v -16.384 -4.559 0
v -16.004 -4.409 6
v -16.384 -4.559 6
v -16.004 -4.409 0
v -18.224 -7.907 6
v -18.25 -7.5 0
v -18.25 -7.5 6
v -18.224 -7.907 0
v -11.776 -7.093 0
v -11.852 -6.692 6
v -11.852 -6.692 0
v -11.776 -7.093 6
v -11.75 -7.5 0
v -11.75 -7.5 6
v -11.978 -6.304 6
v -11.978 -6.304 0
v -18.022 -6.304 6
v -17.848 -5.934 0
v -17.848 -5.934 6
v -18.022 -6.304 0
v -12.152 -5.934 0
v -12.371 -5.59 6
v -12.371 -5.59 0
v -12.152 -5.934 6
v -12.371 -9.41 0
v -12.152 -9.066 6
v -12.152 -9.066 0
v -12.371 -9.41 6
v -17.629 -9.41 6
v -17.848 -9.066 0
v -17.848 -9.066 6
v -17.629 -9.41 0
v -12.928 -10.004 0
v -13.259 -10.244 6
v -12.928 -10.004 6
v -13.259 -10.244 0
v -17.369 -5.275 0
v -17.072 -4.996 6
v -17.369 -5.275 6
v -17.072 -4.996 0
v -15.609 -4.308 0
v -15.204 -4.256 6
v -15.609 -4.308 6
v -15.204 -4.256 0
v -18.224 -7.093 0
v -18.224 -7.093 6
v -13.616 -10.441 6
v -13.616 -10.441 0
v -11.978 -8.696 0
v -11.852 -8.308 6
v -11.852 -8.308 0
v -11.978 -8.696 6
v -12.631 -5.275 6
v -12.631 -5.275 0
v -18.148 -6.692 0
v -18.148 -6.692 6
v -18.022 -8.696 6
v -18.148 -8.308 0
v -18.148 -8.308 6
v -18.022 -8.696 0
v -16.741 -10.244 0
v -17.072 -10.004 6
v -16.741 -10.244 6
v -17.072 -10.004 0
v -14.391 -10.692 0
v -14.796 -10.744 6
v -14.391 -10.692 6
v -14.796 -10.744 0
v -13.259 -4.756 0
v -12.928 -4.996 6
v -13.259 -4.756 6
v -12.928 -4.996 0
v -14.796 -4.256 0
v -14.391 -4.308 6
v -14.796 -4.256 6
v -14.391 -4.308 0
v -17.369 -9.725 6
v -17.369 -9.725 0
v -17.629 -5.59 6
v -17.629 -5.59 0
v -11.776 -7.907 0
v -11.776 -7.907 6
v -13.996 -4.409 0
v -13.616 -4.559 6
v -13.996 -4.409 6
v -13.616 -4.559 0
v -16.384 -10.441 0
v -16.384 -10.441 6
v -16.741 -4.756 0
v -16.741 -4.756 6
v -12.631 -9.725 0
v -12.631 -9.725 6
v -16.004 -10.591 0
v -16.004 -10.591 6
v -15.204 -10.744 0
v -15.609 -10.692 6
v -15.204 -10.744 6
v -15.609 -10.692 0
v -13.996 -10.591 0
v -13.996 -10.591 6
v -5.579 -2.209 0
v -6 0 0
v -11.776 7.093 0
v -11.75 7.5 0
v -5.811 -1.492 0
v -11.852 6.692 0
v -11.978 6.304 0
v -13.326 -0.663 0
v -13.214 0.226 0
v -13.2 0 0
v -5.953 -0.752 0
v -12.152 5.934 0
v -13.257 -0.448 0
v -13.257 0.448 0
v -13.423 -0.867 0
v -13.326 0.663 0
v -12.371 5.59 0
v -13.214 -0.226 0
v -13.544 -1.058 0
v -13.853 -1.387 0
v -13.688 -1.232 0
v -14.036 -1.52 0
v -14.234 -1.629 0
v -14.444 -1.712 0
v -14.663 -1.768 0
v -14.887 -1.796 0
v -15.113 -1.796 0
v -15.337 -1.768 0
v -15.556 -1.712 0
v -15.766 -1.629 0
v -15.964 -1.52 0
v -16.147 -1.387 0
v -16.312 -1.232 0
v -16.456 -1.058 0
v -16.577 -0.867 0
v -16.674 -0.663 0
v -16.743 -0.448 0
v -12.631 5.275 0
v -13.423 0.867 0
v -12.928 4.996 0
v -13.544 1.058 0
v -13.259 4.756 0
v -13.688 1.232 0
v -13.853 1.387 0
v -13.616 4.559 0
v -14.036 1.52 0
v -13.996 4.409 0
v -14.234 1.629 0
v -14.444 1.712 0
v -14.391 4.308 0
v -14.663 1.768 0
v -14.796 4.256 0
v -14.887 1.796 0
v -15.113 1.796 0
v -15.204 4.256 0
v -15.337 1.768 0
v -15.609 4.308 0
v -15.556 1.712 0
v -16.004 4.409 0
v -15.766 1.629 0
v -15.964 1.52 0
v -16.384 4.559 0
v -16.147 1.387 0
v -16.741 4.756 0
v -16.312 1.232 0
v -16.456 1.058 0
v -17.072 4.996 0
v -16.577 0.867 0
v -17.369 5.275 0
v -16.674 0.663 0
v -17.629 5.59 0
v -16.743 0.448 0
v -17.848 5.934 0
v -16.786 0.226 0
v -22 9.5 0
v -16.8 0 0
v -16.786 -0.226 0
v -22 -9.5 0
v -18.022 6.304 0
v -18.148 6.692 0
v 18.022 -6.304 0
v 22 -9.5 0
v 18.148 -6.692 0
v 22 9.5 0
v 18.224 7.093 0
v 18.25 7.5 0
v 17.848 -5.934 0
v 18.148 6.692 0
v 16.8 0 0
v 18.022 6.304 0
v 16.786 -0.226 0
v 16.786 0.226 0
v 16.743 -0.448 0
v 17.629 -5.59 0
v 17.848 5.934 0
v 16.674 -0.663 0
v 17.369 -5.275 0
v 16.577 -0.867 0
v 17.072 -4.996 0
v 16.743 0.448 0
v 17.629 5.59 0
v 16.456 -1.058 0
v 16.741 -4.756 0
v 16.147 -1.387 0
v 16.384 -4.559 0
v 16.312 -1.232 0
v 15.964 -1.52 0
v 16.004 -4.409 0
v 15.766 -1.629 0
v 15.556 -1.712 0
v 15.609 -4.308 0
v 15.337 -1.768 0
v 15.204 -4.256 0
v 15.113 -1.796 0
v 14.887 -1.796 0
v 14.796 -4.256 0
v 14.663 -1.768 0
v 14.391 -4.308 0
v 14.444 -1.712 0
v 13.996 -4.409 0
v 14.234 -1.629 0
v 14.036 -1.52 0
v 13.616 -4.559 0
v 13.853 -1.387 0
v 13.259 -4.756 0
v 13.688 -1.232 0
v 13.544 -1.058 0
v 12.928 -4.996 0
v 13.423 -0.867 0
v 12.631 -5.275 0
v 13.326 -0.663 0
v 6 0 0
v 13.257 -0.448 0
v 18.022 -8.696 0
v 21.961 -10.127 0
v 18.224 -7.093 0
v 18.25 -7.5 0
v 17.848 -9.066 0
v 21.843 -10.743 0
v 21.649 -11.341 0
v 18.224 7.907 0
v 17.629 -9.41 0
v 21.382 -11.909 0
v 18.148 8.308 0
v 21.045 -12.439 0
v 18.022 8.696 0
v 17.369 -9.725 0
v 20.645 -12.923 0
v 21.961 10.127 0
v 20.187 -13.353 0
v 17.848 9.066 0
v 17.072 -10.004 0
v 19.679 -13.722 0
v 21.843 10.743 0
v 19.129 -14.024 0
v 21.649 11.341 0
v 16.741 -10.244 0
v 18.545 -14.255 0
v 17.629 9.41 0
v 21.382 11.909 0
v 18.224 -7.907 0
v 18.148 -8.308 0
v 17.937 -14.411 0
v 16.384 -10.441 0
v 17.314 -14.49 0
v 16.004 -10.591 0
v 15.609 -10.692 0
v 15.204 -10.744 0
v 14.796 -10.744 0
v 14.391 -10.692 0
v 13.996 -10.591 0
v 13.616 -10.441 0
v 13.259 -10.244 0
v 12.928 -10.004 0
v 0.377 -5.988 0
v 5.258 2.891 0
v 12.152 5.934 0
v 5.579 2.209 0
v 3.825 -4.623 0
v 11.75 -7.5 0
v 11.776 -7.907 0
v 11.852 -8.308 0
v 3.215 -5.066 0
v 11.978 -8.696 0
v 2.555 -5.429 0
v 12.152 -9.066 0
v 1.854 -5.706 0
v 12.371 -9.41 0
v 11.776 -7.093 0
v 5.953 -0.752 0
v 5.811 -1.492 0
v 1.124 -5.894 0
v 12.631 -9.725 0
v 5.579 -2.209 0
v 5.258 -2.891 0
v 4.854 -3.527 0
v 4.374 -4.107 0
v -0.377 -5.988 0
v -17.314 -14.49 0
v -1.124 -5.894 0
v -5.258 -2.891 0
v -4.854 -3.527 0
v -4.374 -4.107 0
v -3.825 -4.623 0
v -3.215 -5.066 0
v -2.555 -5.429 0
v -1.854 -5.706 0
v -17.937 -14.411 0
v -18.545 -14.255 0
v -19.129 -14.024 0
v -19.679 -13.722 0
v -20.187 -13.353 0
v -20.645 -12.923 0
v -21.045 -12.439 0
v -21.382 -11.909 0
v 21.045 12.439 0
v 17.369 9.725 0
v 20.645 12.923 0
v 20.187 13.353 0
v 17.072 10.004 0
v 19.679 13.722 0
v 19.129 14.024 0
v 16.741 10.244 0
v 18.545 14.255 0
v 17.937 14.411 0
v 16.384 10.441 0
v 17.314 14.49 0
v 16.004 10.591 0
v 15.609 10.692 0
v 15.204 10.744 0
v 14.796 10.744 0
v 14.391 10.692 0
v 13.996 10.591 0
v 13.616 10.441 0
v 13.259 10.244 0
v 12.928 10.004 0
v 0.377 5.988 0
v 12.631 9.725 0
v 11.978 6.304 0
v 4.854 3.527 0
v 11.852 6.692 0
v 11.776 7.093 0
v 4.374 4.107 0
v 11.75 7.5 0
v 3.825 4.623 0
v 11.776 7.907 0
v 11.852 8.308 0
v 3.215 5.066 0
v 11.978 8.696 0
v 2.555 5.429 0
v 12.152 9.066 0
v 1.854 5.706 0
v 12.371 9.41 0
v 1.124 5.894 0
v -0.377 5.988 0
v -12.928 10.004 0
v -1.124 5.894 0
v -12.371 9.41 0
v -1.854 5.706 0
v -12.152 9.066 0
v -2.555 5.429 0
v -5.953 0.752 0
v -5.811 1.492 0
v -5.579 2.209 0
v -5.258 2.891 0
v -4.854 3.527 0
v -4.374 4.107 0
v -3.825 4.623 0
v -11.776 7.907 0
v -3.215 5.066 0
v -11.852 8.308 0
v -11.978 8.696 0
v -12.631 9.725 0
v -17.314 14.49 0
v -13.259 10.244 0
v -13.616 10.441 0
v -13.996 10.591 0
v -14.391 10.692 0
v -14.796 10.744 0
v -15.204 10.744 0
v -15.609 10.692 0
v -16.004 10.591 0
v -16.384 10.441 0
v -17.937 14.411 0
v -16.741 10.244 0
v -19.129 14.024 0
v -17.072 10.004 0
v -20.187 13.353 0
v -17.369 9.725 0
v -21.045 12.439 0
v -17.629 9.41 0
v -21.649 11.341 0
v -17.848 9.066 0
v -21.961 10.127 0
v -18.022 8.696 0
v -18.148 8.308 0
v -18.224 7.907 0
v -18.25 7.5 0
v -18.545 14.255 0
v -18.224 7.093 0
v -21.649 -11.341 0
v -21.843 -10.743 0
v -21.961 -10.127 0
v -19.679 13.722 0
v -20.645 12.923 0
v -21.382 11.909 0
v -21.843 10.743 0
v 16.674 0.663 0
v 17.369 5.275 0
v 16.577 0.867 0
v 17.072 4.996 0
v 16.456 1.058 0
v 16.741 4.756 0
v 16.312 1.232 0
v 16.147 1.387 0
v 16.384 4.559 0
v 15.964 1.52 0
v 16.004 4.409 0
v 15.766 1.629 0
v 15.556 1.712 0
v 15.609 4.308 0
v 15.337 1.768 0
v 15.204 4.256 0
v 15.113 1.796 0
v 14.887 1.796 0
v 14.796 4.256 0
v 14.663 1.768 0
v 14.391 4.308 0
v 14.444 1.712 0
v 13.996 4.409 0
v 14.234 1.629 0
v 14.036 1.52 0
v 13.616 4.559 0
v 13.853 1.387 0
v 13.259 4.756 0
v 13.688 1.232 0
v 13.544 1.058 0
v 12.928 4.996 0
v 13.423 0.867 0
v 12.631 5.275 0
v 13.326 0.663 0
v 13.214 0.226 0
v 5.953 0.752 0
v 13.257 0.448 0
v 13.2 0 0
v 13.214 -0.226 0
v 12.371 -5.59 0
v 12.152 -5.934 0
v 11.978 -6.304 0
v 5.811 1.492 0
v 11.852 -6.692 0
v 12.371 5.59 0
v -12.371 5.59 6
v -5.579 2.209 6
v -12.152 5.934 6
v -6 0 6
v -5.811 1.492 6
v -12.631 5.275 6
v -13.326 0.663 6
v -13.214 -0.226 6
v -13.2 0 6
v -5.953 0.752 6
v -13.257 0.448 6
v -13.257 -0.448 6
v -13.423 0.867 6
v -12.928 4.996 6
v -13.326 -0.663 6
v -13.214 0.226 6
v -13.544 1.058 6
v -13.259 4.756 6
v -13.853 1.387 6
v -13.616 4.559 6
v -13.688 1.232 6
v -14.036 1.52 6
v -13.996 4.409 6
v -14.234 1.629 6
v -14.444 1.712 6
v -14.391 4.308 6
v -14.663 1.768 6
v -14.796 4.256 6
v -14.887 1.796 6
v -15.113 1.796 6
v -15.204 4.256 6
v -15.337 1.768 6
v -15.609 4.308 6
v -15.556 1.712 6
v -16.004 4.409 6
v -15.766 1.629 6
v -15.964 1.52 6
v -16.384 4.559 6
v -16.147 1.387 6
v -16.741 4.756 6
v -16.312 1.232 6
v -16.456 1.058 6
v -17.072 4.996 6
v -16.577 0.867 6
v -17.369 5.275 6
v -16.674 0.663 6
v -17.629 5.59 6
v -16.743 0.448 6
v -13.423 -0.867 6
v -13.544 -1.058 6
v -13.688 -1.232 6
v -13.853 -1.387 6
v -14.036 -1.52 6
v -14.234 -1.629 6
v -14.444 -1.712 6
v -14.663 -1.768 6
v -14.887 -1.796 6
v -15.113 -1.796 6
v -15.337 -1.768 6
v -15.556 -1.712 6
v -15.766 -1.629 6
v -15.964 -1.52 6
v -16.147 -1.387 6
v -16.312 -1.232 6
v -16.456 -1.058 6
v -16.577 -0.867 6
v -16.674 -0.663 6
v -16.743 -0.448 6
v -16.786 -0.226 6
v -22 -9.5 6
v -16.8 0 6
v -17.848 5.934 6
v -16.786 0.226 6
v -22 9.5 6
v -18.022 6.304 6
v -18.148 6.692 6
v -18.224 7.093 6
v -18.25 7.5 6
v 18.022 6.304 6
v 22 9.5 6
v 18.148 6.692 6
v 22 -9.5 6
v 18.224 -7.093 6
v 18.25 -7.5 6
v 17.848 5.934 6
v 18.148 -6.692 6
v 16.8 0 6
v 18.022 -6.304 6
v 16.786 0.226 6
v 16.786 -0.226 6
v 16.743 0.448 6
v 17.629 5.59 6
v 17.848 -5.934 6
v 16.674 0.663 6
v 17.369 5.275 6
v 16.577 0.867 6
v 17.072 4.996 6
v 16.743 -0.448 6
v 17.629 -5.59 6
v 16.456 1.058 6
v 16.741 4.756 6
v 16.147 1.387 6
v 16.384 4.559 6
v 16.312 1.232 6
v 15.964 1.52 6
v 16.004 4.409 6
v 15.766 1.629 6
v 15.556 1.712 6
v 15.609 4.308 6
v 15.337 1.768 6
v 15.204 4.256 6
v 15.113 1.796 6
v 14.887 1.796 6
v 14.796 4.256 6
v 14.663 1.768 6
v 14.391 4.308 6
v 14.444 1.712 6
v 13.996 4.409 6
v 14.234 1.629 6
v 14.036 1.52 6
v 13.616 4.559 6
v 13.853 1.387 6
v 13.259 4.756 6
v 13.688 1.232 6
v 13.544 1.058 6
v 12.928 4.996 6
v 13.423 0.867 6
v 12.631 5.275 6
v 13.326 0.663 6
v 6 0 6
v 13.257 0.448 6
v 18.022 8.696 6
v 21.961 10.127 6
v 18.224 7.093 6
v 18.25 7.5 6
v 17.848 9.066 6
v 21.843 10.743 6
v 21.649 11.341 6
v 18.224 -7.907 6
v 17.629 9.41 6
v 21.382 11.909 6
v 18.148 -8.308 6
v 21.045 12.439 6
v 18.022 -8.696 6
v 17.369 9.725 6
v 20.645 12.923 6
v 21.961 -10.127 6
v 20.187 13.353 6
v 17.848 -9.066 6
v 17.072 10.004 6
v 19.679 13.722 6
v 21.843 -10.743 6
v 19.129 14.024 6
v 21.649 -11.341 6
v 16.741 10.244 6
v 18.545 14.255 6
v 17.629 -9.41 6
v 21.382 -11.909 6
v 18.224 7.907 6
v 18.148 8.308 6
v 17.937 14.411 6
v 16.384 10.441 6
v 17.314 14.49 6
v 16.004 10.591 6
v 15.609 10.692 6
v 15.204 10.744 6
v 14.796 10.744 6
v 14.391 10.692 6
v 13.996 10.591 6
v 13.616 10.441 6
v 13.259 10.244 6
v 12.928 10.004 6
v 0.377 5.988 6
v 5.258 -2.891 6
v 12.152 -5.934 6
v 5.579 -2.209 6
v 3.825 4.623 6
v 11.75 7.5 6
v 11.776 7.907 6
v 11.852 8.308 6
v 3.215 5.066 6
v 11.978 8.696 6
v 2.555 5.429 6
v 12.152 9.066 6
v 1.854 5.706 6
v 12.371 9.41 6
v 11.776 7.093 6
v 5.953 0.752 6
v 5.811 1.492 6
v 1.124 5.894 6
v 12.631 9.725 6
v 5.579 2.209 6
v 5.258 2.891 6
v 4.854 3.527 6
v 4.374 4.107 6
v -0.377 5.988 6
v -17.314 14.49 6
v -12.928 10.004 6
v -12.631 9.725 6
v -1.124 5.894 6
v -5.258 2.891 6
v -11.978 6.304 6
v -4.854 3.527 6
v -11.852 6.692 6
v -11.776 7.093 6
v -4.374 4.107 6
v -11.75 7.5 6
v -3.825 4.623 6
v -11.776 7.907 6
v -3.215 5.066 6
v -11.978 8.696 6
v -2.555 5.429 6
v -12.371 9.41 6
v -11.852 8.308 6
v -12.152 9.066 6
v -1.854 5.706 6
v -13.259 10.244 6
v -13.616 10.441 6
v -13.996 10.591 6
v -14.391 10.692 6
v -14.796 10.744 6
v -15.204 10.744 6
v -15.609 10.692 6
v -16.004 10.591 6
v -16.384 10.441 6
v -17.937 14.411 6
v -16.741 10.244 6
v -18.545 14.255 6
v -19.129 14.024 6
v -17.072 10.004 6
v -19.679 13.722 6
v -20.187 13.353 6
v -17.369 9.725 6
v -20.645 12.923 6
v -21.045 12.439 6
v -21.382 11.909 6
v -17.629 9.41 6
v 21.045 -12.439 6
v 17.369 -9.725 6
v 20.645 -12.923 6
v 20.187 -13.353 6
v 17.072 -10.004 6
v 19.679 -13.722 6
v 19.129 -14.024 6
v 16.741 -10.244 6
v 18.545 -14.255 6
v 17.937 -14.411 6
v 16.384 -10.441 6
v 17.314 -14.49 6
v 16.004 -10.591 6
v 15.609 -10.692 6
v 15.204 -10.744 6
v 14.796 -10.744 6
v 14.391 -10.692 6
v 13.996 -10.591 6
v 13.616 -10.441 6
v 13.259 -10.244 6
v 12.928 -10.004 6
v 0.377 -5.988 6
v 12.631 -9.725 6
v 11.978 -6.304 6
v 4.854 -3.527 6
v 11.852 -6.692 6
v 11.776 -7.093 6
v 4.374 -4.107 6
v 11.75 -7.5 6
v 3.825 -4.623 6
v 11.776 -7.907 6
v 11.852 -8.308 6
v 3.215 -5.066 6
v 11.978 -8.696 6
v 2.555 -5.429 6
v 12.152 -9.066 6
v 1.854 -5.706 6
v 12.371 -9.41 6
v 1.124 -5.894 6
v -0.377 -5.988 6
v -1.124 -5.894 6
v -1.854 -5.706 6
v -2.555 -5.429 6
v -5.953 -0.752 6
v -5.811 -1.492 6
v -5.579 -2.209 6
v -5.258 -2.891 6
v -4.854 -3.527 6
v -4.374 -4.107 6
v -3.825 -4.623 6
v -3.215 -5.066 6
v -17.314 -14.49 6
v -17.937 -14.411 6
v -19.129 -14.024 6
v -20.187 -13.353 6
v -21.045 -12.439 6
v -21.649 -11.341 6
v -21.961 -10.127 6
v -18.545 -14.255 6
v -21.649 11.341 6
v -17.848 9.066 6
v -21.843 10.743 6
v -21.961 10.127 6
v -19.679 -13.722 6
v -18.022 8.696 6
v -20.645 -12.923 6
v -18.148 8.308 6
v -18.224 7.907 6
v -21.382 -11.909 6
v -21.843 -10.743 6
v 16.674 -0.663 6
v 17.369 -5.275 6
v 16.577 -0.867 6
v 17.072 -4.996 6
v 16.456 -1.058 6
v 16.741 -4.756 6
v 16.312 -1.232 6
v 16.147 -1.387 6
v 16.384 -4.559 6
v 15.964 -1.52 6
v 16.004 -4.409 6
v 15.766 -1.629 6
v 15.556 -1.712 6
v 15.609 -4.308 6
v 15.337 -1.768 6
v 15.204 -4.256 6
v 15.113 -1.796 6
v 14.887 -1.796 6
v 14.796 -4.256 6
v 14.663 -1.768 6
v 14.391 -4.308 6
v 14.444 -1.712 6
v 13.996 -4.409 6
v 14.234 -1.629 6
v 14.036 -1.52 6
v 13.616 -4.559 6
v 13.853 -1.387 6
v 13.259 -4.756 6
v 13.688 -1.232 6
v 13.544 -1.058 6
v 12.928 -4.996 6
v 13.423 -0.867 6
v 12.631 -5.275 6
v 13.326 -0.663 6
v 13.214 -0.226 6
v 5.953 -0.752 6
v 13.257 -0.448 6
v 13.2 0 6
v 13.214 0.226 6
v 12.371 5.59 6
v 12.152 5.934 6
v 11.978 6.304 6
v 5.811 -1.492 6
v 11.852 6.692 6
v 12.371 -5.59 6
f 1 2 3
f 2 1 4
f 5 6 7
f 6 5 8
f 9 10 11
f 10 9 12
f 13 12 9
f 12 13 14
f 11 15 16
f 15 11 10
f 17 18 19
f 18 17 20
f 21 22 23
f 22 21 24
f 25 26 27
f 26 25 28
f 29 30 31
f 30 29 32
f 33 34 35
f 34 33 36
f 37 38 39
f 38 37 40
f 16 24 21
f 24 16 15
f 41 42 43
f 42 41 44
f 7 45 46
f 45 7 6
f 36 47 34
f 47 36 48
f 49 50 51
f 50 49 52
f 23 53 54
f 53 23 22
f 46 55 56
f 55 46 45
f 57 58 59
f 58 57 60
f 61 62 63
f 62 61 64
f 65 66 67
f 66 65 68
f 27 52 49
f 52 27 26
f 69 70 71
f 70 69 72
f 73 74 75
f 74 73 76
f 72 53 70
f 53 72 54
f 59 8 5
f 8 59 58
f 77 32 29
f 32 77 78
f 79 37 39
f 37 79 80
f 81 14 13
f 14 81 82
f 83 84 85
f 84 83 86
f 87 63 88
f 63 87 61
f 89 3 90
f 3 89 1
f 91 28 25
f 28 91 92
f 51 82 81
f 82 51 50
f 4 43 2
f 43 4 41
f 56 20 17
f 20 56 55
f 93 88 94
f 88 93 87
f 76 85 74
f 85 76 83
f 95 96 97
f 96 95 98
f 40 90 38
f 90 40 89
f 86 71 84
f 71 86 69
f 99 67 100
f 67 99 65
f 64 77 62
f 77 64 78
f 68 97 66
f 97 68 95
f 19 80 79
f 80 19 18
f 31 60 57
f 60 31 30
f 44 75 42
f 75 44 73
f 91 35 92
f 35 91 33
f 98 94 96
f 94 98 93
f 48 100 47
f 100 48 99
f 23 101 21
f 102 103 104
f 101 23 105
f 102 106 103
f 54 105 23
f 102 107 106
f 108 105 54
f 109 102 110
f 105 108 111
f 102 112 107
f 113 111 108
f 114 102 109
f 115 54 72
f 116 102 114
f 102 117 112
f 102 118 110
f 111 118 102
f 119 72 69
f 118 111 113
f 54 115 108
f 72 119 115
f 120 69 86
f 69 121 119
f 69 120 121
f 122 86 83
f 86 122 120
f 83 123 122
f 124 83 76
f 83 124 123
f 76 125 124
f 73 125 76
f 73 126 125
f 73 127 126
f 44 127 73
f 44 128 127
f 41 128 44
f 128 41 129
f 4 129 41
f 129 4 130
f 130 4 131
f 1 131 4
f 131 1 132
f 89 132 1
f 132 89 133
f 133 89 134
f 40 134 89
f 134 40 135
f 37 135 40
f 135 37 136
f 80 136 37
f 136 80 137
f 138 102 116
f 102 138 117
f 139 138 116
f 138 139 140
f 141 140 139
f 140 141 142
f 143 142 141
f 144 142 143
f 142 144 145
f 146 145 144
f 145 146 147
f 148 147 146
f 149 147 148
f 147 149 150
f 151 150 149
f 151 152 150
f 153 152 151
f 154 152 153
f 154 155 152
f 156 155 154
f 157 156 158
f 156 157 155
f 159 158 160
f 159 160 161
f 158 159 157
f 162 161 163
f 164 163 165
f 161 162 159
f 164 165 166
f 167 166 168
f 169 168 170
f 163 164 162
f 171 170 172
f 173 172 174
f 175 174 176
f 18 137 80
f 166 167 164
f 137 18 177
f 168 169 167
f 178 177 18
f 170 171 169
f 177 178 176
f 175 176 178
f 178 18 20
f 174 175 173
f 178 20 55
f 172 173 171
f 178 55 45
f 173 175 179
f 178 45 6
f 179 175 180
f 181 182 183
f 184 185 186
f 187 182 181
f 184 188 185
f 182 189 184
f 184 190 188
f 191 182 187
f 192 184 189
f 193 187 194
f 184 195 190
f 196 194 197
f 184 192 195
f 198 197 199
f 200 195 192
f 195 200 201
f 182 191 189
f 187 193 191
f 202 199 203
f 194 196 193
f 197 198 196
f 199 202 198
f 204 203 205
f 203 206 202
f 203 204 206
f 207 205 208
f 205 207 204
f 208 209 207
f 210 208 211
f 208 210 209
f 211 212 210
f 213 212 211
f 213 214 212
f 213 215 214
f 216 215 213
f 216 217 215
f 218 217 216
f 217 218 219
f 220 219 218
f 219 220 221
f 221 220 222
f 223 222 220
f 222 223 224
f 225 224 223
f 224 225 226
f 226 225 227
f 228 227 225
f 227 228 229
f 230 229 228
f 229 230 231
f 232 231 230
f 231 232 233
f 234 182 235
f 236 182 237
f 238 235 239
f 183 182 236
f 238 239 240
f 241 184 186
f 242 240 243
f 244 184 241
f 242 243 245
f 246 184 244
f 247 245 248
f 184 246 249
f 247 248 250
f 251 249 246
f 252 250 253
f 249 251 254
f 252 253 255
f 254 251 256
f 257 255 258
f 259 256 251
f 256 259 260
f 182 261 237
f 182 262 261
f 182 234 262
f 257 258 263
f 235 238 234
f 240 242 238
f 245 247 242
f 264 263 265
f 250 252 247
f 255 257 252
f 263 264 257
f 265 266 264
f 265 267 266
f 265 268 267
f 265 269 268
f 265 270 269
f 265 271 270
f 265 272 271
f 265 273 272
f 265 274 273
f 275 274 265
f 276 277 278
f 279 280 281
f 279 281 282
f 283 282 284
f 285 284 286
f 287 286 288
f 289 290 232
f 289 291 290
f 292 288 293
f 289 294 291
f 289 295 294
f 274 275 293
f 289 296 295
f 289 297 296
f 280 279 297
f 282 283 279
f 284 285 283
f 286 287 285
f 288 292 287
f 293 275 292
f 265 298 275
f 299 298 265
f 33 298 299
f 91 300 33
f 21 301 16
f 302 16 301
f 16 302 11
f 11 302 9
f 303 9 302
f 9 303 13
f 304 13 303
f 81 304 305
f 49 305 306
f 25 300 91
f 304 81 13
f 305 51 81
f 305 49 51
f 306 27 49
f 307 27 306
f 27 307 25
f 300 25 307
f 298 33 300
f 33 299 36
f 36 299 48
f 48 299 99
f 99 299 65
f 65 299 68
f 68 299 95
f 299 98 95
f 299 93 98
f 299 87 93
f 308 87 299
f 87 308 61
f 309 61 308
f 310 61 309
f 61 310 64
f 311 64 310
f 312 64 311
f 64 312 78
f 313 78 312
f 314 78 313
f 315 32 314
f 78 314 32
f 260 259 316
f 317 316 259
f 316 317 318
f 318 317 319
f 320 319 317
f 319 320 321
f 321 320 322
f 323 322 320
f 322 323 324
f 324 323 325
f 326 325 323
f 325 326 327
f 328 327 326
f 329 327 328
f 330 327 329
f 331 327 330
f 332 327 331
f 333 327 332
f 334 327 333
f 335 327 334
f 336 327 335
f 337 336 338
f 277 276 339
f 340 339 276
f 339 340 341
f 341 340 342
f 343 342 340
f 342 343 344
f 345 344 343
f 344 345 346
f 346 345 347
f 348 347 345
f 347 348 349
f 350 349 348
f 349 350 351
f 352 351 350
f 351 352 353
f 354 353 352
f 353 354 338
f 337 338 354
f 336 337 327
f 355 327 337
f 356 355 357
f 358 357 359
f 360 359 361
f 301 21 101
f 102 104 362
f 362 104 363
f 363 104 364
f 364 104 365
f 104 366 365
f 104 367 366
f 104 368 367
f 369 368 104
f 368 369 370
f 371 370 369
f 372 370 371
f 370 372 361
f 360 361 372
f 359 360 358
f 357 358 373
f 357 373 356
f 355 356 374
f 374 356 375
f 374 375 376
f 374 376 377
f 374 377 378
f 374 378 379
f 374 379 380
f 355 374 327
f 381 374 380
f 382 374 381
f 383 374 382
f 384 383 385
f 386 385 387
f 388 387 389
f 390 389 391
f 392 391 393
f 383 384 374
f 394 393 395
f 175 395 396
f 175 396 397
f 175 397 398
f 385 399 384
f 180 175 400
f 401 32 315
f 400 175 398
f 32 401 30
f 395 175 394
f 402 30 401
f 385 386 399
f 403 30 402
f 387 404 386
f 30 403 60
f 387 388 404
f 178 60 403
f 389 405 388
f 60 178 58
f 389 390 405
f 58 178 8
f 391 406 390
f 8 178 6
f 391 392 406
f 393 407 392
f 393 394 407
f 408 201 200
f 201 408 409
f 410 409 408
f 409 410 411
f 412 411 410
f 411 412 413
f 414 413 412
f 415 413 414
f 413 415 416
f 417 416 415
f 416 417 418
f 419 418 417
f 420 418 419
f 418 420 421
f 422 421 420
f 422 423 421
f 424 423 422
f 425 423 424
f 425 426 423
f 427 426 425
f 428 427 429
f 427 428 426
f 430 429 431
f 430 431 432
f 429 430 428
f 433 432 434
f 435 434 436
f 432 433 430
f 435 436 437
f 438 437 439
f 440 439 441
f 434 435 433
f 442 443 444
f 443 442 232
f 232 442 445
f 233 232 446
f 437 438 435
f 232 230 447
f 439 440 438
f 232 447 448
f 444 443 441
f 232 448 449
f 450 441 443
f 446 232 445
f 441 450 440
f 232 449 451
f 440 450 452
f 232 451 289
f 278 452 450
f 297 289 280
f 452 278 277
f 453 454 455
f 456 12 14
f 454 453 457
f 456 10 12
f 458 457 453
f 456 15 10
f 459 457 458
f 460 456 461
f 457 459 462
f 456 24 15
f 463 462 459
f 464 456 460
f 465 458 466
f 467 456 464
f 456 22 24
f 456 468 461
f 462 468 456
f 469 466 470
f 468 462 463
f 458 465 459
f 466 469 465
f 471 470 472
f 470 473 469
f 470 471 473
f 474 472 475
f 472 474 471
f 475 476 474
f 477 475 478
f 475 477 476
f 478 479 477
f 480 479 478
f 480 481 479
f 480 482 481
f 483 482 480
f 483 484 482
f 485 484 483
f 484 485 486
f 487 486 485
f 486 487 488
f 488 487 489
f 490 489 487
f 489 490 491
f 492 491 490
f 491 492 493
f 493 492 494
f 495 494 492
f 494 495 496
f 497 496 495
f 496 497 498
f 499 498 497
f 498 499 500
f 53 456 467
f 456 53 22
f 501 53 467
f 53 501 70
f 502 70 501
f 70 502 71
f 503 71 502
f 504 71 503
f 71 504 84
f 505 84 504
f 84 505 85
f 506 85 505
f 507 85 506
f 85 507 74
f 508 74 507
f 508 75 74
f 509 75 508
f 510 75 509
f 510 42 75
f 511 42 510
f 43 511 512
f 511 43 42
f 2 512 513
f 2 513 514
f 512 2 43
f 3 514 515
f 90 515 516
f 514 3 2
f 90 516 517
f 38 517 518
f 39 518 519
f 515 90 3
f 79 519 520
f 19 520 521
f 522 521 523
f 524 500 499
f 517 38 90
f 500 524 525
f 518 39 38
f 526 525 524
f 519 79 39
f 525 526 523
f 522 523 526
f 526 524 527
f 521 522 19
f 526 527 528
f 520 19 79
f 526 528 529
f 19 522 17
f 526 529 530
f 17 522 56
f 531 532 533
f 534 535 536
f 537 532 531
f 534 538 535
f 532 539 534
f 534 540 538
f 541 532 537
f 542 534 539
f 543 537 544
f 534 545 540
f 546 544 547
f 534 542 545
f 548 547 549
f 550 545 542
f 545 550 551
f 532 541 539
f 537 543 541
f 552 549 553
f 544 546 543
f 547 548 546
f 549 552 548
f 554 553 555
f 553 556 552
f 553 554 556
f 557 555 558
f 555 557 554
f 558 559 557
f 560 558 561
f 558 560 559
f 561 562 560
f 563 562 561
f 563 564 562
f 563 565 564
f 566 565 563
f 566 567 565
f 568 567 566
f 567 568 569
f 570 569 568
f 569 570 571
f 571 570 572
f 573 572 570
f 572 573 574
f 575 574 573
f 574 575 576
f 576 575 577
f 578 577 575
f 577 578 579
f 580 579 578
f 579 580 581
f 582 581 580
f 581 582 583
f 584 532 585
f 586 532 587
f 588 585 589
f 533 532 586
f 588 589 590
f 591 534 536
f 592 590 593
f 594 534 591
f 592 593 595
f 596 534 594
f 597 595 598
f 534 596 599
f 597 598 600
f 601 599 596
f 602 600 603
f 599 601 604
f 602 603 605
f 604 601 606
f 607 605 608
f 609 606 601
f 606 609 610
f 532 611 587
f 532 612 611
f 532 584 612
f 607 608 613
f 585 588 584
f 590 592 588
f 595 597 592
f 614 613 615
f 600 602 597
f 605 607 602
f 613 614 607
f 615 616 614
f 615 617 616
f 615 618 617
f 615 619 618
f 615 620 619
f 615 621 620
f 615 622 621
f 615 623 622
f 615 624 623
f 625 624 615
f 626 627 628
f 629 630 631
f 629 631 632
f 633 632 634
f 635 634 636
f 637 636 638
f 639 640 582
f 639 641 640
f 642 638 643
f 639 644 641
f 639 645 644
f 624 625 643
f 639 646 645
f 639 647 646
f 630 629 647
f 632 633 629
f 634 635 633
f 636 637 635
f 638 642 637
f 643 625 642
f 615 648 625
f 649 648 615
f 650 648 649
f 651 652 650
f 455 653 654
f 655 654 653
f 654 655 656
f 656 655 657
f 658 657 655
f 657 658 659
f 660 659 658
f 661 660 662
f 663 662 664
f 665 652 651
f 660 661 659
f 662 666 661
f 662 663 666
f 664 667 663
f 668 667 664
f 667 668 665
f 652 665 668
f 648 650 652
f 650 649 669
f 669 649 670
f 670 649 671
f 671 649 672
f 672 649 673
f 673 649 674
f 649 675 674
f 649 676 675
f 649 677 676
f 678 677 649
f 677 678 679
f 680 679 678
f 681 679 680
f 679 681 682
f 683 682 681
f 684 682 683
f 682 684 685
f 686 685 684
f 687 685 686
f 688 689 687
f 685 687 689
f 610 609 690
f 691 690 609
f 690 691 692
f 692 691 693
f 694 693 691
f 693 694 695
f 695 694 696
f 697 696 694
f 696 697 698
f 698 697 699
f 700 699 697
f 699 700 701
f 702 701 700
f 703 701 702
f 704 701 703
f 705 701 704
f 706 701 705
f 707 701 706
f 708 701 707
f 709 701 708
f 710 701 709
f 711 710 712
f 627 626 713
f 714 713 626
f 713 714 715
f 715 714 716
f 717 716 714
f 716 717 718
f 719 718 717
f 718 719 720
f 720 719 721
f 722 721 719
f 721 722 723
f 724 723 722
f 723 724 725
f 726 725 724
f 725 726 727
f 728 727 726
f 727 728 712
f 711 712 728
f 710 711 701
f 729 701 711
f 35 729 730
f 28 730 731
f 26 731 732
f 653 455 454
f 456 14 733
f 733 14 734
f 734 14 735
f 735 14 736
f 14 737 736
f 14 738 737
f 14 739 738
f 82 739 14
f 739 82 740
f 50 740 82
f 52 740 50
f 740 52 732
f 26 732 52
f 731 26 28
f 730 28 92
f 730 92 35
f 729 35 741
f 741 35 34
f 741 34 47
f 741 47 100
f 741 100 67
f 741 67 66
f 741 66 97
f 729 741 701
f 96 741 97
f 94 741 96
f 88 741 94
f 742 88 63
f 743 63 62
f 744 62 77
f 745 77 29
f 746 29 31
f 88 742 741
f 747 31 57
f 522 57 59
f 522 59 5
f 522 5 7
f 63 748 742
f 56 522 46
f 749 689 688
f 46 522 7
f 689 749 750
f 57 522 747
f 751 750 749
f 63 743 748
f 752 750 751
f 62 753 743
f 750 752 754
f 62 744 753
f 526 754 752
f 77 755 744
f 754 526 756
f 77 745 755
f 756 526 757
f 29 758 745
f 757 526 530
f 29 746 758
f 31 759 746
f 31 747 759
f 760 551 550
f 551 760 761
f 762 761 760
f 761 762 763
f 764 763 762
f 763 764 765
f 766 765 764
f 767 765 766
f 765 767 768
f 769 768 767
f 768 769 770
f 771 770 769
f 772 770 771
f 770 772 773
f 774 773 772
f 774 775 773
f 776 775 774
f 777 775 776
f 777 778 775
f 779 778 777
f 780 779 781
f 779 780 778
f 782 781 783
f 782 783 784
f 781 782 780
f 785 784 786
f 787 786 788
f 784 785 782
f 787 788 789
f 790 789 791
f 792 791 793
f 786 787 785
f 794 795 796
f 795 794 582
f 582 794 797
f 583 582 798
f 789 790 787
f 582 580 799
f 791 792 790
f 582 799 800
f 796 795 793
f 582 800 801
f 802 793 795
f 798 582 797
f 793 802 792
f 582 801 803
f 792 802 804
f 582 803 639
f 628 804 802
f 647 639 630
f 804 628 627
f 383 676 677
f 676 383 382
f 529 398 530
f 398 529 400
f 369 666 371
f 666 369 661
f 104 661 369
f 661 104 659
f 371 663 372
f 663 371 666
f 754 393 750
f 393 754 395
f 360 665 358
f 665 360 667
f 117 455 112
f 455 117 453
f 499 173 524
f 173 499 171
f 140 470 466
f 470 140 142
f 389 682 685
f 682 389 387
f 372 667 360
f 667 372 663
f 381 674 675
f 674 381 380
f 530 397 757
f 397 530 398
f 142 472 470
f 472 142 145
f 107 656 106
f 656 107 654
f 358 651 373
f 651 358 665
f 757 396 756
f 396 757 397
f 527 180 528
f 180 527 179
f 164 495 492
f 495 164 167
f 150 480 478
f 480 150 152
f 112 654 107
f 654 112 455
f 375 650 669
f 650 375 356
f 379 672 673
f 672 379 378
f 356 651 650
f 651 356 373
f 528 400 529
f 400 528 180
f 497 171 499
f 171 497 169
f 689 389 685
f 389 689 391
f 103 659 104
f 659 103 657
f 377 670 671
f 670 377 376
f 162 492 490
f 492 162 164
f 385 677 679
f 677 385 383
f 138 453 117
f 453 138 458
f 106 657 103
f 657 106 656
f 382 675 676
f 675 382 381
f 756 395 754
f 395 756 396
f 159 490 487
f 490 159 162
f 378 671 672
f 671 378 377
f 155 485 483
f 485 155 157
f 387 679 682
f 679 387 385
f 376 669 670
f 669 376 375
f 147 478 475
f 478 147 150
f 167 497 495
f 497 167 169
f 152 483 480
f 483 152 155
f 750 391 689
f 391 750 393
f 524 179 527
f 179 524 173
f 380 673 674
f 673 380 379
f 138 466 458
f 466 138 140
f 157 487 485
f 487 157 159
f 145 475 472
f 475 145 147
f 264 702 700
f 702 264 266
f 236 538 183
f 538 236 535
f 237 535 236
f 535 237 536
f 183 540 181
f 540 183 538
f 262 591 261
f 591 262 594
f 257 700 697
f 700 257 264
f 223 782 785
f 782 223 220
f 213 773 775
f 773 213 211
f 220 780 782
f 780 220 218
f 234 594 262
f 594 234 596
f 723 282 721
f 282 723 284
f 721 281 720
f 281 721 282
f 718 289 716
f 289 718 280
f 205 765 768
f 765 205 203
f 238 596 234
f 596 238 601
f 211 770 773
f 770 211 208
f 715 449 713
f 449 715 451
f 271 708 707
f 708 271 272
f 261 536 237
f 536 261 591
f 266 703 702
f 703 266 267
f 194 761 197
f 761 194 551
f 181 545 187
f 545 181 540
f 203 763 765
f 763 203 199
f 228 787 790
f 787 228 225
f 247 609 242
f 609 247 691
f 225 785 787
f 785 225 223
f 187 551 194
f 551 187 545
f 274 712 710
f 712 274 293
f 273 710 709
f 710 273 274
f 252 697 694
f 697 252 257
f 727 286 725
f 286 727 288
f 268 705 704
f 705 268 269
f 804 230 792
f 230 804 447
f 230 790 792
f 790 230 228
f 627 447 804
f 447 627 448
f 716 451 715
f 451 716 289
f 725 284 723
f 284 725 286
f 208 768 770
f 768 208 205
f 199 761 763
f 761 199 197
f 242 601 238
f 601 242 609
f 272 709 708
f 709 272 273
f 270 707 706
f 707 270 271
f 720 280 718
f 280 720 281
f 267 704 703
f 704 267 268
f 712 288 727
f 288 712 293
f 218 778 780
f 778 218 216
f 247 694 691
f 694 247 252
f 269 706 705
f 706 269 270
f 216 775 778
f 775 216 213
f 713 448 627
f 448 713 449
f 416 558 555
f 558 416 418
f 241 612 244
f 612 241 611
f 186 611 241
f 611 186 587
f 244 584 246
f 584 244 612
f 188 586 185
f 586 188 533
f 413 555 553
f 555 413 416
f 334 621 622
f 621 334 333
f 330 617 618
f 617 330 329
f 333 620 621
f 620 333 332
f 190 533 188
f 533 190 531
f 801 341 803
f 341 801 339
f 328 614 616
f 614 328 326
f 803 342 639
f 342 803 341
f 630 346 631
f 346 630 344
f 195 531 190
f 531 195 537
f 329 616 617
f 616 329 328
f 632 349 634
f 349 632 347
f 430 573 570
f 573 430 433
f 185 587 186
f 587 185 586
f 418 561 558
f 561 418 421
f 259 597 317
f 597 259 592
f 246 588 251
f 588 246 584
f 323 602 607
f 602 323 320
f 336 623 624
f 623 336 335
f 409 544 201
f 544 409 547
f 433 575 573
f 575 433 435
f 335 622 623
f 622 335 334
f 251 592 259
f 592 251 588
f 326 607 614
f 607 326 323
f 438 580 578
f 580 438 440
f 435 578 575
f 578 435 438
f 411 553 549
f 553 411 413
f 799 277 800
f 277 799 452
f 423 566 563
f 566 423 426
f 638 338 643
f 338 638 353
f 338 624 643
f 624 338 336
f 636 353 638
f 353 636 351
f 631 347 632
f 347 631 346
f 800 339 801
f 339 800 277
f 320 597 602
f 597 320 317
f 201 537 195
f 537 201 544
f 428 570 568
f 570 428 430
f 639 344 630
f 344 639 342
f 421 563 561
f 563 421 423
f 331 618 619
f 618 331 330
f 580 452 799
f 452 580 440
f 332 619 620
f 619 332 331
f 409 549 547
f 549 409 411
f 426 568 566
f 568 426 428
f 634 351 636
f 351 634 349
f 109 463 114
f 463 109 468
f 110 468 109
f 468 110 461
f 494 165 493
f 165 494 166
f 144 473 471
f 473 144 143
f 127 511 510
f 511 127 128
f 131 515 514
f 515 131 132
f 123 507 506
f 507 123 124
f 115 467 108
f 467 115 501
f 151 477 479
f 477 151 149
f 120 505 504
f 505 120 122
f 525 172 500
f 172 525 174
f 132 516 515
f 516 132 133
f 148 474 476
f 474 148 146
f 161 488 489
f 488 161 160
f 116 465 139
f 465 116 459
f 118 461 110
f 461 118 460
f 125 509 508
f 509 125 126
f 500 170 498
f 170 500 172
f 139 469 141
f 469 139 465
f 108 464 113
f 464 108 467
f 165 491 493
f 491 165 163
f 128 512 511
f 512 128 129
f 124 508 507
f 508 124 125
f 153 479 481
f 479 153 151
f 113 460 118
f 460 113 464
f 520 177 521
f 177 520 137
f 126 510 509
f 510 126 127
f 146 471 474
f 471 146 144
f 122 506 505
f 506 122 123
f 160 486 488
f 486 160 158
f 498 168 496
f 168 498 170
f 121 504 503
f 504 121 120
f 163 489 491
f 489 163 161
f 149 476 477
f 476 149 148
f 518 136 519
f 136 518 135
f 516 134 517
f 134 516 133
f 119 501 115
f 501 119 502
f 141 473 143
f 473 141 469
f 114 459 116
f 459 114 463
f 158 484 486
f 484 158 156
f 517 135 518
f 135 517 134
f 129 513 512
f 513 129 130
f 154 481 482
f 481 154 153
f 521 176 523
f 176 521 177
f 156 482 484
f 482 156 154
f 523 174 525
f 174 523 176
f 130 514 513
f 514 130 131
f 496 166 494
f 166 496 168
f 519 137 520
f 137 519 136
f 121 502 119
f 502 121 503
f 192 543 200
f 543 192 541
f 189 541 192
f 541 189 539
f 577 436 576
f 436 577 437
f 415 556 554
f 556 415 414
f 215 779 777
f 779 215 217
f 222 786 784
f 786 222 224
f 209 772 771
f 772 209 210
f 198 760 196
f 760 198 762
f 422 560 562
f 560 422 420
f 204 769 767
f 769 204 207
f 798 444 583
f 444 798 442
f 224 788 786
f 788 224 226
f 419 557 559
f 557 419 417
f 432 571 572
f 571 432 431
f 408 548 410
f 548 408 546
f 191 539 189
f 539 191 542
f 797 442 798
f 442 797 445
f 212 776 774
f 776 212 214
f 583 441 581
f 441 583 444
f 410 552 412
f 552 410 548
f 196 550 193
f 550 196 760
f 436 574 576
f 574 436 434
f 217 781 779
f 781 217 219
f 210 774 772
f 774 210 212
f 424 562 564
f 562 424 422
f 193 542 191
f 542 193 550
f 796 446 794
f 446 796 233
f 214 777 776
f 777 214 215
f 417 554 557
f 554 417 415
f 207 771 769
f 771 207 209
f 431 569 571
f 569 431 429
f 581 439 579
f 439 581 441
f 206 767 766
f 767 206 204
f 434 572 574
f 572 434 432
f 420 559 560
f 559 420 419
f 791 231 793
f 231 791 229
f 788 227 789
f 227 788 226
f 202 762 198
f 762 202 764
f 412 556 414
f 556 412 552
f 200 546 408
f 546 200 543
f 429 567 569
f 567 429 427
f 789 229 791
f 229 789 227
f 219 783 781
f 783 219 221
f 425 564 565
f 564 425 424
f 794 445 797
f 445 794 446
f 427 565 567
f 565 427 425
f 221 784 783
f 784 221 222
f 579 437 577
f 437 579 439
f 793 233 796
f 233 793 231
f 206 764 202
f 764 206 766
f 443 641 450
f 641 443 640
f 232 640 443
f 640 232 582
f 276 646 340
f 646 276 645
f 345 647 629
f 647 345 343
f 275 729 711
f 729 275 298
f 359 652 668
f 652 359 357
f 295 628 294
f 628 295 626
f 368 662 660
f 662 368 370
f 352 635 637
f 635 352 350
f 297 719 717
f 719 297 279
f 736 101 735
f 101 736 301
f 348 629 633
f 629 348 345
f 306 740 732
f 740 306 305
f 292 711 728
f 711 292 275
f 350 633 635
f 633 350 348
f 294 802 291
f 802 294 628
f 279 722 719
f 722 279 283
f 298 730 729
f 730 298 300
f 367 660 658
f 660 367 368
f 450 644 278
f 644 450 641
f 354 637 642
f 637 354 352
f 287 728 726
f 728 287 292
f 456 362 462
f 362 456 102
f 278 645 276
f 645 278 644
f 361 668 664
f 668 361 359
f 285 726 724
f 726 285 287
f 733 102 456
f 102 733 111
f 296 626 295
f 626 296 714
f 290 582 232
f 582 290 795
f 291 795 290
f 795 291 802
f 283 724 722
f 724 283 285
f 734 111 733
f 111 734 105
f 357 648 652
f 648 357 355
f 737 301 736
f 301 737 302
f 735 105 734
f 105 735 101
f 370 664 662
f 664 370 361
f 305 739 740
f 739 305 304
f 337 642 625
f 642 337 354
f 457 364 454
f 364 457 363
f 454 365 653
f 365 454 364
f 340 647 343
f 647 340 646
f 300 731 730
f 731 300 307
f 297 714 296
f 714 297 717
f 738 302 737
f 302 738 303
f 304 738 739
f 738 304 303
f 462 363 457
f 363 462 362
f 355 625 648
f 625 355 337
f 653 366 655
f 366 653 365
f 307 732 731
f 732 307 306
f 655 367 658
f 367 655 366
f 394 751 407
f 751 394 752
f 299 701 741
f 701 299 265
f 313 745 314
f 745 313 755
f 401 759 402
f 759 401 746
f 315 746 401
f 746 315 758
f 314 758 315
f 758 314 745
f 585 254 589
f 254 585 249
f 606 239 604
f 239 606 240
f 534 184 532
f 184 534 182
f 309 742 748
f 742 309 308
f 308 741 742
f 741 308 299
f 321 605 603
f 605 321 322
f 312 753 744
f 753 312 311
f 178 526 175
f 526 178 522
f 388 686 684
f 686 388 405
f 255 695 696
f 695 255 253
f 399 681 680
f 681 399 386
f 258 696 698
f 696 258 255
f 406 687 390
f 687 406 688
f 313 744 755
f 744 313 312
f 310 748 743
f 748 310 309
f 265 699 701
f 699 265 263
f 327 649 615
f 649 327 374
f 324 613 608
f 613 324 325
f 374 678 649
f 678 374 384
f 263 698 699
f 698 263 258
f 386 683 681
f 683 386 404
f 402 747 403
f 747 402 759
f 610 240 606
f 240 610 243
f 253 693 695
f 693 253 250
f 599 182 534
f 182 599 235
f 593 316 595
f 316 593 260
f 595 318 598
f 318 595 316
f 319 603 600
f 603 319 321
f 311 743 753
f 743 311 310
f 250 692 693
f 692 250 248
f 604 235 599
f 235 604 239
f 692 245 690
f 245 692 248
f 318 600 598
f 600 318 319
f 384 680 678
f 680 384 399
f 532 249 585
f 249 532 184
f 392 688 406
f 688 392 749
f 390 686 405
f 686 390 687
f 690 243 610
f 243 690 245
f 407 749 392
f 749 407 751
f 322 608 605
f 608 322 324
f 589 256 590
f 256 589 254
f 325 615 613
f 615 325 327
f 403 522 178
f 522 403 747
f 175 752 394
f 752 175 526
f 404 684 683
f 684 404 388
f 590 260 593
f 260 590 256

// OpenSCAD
$fn = 50;

difference() {
	union() {
		hull() {
			translate(v = [-17.0, 9.5, 0]) {
				cylinder(h = 6, r = 5);
			}
			translate(v = [17.0, 9.5, 0]) {
				cylinder(h = 6, r = 5);
			}
			translate(v = [-17.0, -9.5, 0]) {
				cylinder(h = 6, r = 5);
			}
			translate(v = [17.0, -9.5, 0]) {
				cylinder(h = 6, r = 5);
			}
		}
	}
	union() {
		translate(v = [-15.0, -7.5, 0]) {
			cylinder(h = 6, r = 3.25);
		}
		translate(v = [-15.0, 7.5, 0]) {
			cylinder(h = 6, r = 3.25);
		}
		translate(v = [15.0, -7.5, 0]) {
			cylinder(h = 6, r = 3.25);
		}
		translate(v = [15.0, 7.5, 0]) {
			cylinder(h = 6, r = 3.25);
		}
		translate(v = [-15.0, 0.0, 0]) {
			cylinder(h = 6, r = 1.8);
		}
		translate(v = [15.0, 0.0, 0]) {
			cylinder(h = 6, r = 1.8);
		}
		cylinder(h = 6, r = 6.0);
	}
}
